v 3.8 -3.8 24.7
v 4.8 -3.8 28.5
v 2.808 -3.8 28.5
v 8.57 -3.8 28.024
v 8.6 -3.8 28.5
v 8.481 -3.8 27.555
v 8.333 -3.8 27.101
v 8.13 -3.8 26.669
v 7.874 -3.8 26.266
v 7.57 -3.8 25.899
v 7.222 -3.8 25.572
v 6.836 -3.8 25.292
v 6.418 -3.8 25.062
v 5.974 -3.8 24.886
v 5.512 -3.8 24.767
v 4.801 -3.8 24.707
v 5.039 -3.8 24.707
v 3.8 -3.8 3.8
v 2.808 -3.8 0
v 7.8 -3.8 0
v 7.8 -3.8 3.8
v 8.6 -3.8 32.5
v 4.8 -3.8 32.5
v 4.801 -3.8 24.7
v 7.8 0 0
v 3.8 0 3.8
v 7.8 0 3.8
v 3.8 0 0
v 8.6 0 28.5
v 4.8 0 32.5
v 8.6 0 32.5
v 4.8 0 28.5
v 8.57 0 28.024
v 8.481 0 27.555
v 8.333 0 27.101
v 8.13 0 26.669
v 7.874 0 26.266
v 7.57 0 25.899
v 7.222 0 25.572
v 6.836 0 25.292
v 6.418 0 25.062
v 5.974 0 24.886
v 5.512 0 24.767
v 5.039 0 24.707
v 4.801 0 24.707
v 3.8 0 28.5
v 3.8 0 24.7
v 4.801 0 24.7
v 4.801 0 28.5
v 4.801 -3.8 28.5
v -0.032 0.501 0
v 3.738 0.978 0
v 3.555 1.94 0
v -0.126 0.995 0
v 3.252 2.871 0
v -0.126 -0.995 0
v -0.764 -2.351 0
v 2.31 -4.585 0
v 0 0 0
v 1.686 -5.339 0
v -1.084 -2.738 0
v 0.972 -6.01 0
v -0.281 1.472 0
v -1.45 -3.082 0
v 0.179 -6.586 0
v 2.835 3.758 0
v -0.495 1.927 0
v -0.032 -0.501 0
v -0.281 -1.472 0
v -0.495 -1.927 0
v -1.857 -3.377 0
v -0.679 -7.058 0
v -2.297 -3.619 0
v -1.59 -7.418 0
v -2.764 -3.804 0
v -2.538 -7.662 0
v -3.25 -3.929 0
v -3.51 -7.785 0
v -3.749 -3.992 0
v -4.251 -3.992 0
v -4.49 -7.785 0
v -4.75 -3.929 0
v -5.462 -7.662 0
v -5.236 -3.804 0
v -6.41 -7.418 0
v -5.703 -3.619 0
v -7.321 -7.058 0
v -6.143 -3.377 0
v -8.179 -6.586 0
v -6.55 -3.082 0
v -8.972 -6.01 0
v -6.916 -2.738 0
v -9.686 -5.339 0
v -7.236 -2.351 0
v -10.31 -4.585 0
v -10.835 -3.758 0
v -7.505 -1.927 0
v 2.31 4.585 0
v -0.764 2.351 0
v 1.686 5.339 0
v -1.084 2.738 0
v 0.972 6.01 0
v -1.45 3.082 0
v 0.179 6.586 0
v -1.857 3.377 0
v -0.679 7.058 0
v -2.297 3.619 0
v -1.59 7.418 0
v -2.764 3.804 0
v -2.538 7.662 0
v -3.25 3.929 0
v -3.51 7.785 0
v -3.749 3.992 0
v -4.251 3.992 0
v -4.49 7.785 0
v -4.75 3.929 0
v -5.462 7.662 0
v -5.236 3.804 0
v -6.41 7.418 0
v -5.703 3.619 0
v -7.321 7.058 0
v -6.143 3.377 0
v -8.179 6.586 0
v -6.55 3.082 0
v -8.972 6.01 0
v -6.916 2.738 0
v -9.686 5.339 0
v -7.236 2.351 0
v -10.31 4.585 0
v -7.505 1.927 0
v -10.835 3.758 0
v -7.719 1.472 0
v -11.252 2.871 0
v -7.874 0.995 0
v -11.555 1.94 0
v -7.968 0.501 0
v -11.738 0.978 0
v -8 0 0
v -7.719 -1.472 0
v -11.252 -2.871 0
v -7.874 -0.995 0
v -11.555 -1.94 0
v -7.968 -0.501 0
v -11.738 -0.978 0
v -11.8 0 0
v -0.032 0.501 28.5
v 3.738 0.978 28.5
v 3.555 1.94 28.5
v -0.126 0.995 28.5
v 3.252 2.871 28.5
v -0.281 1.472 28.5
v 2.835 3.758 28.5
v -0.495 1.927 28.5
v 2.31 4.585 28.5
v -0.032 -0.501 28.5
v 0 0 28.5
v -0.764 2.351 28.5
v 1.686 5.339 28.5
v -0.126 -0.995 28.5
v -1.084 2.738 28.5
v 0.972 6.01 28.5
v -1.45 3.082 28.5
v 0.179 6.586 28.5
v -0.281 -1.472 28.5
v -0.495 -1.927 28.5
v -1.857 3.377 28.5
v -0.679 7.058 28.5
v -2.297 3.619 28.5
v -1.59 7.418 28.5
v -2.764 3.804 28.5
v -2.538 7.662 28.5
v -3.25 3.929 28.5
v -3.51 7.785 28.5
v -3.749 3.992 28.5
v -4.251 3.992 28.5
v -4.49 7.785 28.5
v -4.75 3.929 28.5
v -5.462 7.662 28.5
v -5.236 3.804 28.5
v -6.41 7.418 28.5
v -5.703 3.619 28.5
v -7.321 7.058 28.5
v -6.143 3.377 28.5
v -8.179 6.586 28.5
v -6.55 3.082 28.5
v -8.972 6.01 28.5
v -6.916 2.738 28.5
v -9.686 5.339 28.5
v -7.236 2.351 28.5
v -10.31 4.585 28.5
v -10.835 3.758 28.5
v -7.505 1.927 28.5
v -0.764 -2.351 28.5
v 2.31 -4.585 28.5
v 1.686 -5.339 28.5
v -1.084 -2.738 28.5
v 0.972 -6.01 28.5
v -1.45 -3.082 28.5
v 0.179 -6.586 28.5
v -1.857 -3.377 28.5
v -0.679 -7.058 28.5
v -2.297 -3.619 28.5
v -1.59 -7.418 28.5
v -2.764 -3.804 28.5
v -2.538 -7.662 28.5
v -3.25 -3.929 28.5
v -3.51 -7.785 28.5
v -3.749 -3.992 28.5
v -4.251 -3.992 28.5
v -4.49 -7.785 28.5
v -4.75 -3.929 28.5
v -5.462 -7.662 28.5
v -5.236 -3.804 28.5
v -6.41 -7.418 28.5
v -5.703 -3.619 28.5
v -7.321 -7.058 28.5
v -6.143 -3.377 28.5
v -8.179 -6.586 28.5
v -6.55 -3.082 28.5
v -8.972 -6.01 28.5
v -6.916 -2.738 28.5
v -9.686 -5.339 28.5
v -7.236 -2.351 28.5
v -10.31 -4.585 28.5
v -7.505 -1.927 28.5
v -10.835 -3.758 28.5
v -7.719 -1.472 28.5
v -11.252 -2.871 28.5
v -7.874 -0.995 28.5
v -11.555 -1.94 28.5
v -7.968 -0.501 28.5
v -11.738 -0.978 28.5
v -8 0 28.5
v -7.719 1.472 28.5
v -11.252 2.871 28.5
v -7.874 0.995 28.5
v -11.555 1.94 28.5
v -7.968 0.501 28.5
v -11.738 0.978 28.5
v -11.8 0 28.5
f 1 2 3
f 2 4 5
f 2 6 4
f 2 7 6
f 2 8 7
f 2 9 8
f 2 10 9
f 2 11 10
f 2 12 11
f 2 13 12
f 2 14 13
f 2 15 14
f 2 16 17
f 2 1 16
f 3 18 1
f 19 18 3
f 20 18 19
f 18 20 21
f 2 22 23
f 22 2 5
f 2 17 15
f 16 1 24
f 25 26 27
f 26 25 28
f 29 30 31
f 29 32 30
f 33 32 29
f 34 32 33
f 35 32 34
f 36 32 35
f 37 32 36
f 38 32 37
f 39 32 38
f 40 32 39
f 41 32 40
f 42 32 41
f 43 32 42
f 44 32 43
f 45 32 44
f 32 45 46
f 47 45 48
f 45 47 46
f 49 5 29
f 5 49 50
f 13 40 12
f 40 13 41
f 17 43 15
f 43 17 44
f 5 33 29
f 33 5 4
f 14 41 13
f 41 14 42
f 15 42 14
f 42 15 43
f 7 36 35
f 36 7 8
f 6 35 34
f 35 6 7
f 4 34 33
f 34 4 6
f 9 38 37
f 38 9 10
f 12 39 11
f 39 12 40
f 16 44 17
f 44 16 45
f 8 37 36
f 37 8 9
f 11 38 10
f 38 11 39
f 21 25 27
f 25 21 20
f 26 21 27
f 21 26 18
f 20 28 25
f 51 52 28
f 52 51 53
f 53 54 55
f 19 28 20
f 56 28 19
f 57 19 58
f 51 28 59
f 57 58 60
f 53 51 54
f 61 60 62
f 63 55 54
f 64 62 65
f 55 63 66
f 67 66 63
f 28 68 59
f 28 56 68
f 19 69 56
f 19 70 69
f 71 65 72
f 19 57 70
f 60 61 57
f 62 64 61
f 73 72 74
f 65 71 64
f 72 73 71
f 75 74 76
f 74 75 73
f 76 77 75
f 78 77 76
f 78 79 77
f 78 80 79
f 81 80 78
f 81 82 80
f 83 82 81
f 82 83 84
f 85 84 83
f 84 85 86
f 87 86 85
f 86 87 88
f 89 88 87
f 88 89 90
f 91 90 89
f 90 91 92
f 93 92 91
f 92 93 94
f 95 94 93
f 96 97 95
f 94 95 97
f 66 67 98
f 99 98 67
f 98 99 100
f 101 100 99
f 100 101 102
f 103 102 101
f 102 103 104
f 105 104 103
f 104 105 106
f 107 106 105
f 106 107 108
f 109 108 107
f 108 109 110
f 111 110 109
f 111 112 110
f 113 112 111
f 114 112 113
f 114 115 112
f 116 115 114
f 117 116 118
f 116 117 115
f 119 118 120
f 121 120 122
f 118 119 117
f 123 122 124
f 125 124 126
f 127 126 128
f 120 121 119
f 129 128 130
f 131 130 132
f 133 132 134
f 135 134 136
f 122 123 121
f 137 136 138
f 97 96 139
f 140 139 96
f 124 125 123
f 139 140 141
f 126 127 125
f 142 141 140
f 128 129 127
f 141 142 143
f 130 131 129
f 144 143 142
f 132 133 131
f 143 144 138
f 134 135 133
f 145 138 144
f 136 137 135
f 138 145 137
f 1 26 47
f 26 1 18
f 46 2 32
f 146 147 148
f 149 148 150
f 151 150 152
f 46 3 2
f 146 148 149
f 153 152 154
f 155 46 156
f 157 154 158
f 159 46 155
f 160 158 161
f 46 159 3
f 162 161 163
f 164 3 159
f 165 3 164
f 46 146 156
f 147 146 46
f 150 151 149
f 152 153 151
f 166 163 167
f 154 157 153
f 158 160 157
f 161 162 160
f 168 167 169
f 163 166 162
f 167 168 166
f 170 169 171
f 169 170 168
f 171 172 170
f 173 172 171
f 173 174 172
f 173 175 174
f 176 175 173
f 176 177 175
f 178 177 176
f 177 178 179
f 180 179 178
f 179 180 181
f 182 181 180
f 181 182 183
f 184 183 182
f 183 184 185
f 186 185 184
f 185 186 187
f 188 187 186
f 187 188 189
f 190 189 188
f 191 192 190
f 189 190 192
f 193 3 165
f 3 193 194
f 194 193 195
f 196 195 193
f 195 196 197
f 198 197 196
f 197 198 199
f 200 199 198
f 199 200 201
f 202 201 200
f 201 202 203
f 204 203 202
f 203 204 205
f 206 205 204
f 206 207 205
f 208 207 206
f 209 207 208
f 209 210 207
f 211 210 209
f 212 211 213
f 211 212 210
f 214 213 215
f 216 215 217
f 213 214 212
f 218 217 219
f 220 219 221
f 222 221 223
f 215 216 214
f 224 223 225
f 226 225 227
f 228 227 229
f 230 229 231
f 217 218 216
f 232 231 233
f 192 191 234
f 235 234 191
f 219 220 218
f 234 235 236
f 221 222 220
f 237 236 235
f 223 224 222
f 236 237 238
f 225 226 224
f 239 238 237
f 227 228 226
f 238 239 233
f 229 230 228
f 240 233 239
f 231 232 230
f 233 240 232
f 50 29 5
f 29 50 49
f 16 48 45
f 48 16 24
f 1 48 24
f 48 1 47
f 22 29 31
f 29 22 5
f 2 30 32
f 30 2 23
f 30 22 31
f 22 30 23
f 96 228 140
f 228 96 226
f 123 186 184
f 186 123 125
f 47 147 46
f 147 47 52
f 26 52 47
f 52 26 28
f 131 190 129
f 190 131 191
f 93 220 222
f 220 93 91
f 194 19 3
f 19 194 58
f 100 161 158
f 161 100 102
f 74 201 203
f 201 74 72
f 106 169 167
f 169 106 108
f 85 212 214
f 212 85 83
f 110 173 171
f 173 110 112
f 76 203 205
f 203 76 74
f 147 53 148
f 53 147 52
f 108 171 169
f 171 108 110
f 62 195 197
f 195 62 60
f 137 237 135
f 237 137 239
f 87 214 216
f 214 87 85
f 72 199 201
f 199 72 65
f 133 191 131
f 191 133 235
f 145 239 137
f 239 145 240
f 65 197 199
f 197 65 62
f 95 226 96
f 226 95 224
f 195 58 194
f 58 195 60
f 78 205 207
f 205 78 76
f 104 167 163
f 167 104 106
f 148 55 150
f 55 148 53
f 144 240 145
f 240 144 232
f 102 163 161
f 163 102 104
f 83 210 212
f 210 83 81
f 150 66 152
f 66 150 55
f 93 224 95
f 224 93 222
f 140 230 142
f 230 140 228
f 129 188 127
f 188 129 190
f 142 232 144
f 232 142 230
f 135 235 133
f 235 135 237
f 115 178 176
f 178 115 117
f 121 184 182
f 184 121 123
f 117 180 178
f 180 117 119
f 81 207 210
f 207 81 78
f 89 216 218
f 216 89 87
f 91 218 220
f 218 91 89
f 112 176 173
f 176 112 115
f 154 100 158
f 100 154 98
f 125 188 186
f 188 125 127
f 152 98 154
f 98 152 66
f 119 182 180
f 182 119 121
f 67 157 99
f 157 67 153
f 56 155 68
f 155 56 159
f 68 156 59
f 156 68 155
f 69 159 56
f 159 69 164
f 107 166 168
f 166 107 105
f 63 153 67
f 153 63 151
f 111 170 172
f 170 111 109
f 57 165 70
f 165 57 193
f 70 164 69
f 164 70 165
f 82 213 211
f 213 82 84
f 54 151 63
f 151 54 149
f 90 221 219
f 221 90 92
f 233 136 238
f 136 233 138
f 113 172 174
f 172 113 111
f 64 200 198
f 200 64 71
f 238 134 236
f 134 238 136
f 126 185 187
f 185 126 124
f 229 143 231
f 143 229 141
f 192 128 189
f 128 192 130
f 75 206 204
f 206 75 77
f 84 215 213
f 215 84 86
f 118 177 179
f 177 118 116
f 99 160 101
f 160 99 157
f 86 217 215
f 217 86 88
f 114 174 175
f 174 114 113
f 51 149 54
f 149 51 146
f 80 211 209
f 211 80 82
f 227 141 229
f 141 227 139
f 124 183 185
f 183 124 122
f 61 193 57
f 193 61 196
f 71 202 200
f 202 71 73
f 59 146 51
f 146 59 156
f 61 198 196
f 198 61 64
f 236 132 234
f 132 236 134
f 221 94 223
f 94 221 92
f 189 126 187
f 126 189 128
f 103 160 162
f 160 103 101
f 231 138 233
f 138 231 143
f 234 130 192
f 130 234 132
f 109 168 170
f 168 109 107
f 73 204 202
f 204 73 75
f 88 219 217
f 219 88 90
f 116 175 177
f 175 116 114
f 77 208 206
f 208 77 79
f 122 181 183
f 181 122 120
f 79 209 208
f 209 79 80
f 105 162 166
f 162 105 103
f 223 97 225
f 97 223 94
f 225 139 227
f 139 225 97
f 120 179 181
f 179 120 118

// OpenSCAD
// file: pegboard-modules.scad
module hanger(height, width, pin_height) {
    cube([width+pin_height, width, width]);
    cube([width, height, width]);
    translate([0, height-width, 0]) cube([width + 1 + 0.001, width, width]);
    translate([width+1, height, 0]) cube([width, pin_height, width]);
    translate([width+1, height-width, 0]) intersection() {
        cube([width, width, width]);
        translate([0, width, 0]) cylinder(r=width, $fn=50, h=width);
    }
}
// main file
use <pegboard-modules.scad>;

long_height = 28.5;
width = 3.8;
pin_height = 4;

rotate([90,0,0]) union() {
    hanger(long_height, width, pin_height);
    translate([-4,, long_height,0]) rotate([90,0,0]) difference() {
        cylinder(r=4 + 3.8, h=long_height, $fn=50);
        cylinder(r=4, h=long_height, $fn=50);
    }
}
